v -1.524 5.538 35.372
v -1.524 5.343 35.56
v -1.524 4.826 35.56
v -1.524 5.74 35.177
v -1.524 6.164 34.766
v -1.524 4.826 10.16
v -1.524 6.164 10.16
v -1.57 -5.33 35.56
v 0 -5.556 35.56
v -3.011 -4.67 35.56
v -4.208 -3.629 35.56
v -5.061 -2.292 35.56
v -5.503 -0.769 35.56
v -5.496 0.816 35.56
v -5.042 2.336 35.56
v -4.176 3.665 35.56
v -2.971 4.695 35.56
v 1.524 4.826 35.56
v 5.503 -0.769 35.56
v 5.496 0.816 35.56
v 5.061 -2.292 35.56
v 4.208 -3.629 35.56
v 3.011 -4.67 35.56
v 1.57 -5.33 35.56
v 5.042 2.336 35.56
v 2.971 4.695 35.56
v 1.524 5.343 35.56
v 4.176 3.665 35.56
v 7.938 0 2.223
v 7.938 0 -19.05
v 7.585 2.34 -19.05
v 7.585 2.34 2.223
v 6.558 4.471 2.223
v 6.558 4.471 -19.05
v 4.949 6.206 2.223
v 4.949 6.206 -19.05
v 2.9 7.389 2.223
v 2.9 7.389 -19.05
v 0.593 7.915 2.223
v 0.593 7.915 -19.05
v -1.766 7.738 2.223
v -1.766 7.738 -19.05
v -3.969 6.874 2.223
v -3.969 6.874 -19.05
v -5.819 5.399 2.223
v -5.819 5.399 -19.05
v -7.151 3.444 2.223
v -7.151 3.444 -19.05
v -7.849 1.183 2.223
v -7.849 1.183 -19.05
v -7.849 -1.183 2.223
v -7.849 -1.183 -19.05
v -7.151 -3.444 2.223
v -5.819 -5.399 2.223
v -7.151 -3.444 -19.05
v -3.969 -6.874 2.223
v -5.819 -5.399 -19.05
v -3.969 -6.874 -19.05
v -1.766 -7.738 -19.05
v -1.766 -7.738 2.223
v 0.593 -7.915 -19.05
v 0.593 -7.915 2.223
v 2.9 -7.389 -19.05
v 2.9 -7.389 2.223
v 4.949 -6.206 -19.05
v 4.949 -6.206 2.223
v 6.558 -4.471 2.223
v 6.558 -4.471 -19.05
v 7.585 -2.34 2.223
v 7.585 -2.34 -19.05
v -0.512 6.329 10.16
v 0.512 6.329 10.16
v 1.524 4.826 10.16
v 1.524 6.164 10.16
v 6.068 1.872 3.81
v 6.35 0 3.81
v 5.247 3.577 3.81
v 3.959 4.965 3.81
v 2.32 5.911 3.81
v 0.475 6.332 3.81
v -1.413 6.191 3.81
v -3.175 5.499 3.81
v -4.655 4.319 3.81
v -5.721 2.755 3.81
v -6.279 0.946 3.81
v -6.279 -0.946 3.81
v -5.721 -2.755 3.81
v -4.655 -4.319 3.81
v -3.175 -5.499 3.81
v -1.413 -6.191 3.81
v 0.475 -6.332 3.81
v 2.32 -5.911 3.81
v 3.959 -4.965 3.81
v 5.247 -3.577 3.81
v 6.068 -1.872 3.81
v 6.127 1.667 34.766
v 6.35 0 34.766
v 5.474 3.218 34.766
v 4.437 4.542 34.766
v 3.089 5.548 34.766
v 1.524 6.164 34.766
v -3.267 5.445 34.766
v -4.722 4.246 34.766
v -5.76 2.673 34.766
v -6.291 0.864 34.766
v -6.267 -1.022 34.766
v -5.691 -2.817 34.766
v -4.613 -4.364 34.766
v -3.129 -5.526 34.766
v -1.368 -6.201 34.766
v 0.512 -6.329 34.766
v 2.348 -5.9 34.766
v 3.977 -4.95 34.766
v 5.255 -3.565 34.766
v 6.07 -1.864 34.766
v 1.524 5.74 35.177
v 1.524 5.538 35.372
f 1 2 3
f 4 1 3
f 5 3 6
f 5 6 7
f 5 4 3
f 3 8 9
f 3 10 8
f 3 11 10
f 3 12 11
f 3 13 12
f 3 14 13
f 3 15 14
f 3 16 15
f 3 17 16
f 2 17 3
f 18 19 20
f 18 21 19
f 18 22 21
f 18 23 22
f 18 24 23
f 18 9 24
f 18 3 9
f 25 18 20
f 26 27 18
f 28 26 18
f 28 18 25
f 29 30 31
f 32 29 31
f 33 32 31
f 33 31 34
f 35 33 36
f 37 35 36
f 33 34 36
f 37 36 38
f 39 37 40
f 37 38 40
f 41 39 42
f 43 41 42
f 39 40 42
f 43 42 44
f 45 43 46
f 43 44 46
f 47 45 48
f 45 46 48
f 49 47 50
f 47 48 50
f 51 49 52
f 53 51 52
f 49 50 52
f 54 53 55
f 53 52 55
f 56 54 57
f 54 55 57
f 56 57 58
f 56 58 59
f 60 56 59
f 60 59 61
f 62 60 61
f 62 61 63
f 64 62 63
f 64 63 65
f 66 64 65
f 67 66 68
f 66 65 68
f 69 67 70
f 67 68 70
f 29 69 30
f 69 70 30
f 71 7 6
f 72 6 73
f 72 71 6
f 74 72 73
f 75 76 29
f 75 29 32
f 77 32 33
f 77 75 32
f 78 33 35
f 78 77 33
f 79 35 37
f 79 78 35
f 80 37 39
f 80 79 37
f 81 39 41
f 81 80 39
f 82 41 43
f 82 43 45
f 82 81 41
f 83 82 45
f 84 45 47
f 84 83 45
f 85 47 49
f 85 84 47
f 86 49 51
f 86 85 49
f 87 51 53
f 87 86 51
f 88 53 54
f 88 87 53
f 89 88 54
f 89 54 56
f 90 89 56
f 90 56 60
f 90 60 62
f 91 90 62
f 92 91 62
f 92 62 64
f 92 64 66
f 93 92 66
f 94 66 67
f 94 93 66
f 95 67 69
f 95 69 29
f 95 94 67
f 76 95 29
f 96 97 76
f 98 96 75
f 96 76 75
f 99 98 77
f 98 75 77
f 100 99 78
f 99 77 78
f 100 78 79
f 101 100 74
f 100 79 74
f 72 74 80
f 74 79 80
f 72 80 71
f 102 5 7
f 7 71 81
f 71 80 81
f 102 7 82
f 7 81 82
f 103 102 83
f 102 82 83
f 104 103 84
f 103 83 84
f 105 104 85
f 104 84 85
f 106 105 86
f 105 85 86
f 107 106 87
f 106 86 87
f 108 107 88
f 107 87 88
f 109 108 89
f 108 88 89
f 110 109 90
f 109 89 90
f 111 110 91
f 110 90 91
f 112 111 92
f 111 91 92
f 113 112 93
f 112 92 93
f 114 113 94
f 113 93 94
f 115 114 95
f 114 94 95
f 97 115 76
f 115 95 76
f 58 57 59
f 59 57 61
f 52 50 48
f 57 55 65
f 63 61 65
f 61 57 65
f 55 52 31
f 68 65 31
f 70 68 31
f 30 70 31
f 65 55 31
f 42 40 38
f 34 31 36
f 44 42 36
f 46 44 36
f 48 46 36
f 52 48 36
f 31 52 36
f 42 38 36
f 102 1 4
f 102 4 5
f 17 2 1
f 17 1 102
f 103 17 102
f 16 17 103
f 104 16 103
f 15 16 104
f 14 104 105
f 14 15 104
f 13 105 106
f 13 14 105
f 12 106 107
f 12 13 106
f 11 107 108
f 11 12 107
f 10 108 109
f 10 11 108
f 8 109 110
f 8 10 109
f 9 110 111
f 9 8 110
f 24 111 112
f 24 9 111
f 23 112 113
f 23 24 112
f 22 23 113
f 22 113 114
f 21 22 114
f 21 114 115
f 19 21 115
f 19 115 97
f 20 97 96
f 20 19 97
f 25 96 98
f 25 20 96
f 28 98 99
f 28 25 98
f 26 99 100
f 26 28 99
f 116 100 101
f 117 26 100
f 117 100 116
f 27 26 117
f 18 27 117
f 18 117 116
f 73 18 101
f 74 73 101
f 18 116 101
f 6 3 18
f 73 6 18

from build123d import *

# Parameters (mm, degrees)
BOSS_EXTRUDE1_DEPTH      = 3.81
BOSS_EXTRUDE1_DEPTH_BACK = 19.05
SKETCH1_R                = 7.9375
SKETCH2_R                = 6.35
BOSS_EXTRUDE2_DEPTH      = 31.75
CHAMFER1_SIZE            = 1.5875
CHAMFER2_SIZE            = 0.79375
SKETCH3_W                = 3.048
SKETCH3_H                = 1.524
CUT_EXTRUDE1_DEPTH       = 25.4


with BuildPart() as part:
    # Sketch1 → Boss-Extrude1 (new, two sides: drawn at the far end of the back side and taken through both)
    with BuildSketch(Plane.XY.offset(-BOSS_EXTRUDE1_DEPTH_BACK)):
        Circle(SKETCH1_R)
    extrude(amount=BOSS_EXTRUDE1_DEPTH + BOSS_EXTRUDE1_DEPTH_BACK)

    # Sketch2 → Boss-Extrude2 (add)
    with BuildSketch(Plane.XY.offset(3.81)):
        Circle(SKETCH2_R)
    extrude(amount=BOSS_EXTRUDE2_DEPTH)

    # Chamfer1
    chamfer1_edges = [part.edges().sort_by_distance(p)[0] for p in [
        (-7.9375, 0, 3.81),
    ]]
    chamfer(chamfer1_edges, length=CHAMFER1_SIZE - 0.0001)  # a hair under: the kernel refuses the full size

    # Chamfer2
    chamfer2_edges = [part.edges().sort_by_distance(p)[0] for p in [
        (-6.35, 0, 35.56),
    ]]
    chamfer(chamfer2_edges, length=CHAMFER2_SIZE)

    # Sketch3 → Cut-Extrude1 (cut)
    with BuildSketch(Plane.XY.offset(35.56)):
        with Locations((0, 5.588)):
            Rectangle(SKETCH3_W, SKETCH3_H)
    extrude(amount=-CUT_EXTRUDE1_DEPTH, mode=Mode.SUBTRACT)


solid = part.part
